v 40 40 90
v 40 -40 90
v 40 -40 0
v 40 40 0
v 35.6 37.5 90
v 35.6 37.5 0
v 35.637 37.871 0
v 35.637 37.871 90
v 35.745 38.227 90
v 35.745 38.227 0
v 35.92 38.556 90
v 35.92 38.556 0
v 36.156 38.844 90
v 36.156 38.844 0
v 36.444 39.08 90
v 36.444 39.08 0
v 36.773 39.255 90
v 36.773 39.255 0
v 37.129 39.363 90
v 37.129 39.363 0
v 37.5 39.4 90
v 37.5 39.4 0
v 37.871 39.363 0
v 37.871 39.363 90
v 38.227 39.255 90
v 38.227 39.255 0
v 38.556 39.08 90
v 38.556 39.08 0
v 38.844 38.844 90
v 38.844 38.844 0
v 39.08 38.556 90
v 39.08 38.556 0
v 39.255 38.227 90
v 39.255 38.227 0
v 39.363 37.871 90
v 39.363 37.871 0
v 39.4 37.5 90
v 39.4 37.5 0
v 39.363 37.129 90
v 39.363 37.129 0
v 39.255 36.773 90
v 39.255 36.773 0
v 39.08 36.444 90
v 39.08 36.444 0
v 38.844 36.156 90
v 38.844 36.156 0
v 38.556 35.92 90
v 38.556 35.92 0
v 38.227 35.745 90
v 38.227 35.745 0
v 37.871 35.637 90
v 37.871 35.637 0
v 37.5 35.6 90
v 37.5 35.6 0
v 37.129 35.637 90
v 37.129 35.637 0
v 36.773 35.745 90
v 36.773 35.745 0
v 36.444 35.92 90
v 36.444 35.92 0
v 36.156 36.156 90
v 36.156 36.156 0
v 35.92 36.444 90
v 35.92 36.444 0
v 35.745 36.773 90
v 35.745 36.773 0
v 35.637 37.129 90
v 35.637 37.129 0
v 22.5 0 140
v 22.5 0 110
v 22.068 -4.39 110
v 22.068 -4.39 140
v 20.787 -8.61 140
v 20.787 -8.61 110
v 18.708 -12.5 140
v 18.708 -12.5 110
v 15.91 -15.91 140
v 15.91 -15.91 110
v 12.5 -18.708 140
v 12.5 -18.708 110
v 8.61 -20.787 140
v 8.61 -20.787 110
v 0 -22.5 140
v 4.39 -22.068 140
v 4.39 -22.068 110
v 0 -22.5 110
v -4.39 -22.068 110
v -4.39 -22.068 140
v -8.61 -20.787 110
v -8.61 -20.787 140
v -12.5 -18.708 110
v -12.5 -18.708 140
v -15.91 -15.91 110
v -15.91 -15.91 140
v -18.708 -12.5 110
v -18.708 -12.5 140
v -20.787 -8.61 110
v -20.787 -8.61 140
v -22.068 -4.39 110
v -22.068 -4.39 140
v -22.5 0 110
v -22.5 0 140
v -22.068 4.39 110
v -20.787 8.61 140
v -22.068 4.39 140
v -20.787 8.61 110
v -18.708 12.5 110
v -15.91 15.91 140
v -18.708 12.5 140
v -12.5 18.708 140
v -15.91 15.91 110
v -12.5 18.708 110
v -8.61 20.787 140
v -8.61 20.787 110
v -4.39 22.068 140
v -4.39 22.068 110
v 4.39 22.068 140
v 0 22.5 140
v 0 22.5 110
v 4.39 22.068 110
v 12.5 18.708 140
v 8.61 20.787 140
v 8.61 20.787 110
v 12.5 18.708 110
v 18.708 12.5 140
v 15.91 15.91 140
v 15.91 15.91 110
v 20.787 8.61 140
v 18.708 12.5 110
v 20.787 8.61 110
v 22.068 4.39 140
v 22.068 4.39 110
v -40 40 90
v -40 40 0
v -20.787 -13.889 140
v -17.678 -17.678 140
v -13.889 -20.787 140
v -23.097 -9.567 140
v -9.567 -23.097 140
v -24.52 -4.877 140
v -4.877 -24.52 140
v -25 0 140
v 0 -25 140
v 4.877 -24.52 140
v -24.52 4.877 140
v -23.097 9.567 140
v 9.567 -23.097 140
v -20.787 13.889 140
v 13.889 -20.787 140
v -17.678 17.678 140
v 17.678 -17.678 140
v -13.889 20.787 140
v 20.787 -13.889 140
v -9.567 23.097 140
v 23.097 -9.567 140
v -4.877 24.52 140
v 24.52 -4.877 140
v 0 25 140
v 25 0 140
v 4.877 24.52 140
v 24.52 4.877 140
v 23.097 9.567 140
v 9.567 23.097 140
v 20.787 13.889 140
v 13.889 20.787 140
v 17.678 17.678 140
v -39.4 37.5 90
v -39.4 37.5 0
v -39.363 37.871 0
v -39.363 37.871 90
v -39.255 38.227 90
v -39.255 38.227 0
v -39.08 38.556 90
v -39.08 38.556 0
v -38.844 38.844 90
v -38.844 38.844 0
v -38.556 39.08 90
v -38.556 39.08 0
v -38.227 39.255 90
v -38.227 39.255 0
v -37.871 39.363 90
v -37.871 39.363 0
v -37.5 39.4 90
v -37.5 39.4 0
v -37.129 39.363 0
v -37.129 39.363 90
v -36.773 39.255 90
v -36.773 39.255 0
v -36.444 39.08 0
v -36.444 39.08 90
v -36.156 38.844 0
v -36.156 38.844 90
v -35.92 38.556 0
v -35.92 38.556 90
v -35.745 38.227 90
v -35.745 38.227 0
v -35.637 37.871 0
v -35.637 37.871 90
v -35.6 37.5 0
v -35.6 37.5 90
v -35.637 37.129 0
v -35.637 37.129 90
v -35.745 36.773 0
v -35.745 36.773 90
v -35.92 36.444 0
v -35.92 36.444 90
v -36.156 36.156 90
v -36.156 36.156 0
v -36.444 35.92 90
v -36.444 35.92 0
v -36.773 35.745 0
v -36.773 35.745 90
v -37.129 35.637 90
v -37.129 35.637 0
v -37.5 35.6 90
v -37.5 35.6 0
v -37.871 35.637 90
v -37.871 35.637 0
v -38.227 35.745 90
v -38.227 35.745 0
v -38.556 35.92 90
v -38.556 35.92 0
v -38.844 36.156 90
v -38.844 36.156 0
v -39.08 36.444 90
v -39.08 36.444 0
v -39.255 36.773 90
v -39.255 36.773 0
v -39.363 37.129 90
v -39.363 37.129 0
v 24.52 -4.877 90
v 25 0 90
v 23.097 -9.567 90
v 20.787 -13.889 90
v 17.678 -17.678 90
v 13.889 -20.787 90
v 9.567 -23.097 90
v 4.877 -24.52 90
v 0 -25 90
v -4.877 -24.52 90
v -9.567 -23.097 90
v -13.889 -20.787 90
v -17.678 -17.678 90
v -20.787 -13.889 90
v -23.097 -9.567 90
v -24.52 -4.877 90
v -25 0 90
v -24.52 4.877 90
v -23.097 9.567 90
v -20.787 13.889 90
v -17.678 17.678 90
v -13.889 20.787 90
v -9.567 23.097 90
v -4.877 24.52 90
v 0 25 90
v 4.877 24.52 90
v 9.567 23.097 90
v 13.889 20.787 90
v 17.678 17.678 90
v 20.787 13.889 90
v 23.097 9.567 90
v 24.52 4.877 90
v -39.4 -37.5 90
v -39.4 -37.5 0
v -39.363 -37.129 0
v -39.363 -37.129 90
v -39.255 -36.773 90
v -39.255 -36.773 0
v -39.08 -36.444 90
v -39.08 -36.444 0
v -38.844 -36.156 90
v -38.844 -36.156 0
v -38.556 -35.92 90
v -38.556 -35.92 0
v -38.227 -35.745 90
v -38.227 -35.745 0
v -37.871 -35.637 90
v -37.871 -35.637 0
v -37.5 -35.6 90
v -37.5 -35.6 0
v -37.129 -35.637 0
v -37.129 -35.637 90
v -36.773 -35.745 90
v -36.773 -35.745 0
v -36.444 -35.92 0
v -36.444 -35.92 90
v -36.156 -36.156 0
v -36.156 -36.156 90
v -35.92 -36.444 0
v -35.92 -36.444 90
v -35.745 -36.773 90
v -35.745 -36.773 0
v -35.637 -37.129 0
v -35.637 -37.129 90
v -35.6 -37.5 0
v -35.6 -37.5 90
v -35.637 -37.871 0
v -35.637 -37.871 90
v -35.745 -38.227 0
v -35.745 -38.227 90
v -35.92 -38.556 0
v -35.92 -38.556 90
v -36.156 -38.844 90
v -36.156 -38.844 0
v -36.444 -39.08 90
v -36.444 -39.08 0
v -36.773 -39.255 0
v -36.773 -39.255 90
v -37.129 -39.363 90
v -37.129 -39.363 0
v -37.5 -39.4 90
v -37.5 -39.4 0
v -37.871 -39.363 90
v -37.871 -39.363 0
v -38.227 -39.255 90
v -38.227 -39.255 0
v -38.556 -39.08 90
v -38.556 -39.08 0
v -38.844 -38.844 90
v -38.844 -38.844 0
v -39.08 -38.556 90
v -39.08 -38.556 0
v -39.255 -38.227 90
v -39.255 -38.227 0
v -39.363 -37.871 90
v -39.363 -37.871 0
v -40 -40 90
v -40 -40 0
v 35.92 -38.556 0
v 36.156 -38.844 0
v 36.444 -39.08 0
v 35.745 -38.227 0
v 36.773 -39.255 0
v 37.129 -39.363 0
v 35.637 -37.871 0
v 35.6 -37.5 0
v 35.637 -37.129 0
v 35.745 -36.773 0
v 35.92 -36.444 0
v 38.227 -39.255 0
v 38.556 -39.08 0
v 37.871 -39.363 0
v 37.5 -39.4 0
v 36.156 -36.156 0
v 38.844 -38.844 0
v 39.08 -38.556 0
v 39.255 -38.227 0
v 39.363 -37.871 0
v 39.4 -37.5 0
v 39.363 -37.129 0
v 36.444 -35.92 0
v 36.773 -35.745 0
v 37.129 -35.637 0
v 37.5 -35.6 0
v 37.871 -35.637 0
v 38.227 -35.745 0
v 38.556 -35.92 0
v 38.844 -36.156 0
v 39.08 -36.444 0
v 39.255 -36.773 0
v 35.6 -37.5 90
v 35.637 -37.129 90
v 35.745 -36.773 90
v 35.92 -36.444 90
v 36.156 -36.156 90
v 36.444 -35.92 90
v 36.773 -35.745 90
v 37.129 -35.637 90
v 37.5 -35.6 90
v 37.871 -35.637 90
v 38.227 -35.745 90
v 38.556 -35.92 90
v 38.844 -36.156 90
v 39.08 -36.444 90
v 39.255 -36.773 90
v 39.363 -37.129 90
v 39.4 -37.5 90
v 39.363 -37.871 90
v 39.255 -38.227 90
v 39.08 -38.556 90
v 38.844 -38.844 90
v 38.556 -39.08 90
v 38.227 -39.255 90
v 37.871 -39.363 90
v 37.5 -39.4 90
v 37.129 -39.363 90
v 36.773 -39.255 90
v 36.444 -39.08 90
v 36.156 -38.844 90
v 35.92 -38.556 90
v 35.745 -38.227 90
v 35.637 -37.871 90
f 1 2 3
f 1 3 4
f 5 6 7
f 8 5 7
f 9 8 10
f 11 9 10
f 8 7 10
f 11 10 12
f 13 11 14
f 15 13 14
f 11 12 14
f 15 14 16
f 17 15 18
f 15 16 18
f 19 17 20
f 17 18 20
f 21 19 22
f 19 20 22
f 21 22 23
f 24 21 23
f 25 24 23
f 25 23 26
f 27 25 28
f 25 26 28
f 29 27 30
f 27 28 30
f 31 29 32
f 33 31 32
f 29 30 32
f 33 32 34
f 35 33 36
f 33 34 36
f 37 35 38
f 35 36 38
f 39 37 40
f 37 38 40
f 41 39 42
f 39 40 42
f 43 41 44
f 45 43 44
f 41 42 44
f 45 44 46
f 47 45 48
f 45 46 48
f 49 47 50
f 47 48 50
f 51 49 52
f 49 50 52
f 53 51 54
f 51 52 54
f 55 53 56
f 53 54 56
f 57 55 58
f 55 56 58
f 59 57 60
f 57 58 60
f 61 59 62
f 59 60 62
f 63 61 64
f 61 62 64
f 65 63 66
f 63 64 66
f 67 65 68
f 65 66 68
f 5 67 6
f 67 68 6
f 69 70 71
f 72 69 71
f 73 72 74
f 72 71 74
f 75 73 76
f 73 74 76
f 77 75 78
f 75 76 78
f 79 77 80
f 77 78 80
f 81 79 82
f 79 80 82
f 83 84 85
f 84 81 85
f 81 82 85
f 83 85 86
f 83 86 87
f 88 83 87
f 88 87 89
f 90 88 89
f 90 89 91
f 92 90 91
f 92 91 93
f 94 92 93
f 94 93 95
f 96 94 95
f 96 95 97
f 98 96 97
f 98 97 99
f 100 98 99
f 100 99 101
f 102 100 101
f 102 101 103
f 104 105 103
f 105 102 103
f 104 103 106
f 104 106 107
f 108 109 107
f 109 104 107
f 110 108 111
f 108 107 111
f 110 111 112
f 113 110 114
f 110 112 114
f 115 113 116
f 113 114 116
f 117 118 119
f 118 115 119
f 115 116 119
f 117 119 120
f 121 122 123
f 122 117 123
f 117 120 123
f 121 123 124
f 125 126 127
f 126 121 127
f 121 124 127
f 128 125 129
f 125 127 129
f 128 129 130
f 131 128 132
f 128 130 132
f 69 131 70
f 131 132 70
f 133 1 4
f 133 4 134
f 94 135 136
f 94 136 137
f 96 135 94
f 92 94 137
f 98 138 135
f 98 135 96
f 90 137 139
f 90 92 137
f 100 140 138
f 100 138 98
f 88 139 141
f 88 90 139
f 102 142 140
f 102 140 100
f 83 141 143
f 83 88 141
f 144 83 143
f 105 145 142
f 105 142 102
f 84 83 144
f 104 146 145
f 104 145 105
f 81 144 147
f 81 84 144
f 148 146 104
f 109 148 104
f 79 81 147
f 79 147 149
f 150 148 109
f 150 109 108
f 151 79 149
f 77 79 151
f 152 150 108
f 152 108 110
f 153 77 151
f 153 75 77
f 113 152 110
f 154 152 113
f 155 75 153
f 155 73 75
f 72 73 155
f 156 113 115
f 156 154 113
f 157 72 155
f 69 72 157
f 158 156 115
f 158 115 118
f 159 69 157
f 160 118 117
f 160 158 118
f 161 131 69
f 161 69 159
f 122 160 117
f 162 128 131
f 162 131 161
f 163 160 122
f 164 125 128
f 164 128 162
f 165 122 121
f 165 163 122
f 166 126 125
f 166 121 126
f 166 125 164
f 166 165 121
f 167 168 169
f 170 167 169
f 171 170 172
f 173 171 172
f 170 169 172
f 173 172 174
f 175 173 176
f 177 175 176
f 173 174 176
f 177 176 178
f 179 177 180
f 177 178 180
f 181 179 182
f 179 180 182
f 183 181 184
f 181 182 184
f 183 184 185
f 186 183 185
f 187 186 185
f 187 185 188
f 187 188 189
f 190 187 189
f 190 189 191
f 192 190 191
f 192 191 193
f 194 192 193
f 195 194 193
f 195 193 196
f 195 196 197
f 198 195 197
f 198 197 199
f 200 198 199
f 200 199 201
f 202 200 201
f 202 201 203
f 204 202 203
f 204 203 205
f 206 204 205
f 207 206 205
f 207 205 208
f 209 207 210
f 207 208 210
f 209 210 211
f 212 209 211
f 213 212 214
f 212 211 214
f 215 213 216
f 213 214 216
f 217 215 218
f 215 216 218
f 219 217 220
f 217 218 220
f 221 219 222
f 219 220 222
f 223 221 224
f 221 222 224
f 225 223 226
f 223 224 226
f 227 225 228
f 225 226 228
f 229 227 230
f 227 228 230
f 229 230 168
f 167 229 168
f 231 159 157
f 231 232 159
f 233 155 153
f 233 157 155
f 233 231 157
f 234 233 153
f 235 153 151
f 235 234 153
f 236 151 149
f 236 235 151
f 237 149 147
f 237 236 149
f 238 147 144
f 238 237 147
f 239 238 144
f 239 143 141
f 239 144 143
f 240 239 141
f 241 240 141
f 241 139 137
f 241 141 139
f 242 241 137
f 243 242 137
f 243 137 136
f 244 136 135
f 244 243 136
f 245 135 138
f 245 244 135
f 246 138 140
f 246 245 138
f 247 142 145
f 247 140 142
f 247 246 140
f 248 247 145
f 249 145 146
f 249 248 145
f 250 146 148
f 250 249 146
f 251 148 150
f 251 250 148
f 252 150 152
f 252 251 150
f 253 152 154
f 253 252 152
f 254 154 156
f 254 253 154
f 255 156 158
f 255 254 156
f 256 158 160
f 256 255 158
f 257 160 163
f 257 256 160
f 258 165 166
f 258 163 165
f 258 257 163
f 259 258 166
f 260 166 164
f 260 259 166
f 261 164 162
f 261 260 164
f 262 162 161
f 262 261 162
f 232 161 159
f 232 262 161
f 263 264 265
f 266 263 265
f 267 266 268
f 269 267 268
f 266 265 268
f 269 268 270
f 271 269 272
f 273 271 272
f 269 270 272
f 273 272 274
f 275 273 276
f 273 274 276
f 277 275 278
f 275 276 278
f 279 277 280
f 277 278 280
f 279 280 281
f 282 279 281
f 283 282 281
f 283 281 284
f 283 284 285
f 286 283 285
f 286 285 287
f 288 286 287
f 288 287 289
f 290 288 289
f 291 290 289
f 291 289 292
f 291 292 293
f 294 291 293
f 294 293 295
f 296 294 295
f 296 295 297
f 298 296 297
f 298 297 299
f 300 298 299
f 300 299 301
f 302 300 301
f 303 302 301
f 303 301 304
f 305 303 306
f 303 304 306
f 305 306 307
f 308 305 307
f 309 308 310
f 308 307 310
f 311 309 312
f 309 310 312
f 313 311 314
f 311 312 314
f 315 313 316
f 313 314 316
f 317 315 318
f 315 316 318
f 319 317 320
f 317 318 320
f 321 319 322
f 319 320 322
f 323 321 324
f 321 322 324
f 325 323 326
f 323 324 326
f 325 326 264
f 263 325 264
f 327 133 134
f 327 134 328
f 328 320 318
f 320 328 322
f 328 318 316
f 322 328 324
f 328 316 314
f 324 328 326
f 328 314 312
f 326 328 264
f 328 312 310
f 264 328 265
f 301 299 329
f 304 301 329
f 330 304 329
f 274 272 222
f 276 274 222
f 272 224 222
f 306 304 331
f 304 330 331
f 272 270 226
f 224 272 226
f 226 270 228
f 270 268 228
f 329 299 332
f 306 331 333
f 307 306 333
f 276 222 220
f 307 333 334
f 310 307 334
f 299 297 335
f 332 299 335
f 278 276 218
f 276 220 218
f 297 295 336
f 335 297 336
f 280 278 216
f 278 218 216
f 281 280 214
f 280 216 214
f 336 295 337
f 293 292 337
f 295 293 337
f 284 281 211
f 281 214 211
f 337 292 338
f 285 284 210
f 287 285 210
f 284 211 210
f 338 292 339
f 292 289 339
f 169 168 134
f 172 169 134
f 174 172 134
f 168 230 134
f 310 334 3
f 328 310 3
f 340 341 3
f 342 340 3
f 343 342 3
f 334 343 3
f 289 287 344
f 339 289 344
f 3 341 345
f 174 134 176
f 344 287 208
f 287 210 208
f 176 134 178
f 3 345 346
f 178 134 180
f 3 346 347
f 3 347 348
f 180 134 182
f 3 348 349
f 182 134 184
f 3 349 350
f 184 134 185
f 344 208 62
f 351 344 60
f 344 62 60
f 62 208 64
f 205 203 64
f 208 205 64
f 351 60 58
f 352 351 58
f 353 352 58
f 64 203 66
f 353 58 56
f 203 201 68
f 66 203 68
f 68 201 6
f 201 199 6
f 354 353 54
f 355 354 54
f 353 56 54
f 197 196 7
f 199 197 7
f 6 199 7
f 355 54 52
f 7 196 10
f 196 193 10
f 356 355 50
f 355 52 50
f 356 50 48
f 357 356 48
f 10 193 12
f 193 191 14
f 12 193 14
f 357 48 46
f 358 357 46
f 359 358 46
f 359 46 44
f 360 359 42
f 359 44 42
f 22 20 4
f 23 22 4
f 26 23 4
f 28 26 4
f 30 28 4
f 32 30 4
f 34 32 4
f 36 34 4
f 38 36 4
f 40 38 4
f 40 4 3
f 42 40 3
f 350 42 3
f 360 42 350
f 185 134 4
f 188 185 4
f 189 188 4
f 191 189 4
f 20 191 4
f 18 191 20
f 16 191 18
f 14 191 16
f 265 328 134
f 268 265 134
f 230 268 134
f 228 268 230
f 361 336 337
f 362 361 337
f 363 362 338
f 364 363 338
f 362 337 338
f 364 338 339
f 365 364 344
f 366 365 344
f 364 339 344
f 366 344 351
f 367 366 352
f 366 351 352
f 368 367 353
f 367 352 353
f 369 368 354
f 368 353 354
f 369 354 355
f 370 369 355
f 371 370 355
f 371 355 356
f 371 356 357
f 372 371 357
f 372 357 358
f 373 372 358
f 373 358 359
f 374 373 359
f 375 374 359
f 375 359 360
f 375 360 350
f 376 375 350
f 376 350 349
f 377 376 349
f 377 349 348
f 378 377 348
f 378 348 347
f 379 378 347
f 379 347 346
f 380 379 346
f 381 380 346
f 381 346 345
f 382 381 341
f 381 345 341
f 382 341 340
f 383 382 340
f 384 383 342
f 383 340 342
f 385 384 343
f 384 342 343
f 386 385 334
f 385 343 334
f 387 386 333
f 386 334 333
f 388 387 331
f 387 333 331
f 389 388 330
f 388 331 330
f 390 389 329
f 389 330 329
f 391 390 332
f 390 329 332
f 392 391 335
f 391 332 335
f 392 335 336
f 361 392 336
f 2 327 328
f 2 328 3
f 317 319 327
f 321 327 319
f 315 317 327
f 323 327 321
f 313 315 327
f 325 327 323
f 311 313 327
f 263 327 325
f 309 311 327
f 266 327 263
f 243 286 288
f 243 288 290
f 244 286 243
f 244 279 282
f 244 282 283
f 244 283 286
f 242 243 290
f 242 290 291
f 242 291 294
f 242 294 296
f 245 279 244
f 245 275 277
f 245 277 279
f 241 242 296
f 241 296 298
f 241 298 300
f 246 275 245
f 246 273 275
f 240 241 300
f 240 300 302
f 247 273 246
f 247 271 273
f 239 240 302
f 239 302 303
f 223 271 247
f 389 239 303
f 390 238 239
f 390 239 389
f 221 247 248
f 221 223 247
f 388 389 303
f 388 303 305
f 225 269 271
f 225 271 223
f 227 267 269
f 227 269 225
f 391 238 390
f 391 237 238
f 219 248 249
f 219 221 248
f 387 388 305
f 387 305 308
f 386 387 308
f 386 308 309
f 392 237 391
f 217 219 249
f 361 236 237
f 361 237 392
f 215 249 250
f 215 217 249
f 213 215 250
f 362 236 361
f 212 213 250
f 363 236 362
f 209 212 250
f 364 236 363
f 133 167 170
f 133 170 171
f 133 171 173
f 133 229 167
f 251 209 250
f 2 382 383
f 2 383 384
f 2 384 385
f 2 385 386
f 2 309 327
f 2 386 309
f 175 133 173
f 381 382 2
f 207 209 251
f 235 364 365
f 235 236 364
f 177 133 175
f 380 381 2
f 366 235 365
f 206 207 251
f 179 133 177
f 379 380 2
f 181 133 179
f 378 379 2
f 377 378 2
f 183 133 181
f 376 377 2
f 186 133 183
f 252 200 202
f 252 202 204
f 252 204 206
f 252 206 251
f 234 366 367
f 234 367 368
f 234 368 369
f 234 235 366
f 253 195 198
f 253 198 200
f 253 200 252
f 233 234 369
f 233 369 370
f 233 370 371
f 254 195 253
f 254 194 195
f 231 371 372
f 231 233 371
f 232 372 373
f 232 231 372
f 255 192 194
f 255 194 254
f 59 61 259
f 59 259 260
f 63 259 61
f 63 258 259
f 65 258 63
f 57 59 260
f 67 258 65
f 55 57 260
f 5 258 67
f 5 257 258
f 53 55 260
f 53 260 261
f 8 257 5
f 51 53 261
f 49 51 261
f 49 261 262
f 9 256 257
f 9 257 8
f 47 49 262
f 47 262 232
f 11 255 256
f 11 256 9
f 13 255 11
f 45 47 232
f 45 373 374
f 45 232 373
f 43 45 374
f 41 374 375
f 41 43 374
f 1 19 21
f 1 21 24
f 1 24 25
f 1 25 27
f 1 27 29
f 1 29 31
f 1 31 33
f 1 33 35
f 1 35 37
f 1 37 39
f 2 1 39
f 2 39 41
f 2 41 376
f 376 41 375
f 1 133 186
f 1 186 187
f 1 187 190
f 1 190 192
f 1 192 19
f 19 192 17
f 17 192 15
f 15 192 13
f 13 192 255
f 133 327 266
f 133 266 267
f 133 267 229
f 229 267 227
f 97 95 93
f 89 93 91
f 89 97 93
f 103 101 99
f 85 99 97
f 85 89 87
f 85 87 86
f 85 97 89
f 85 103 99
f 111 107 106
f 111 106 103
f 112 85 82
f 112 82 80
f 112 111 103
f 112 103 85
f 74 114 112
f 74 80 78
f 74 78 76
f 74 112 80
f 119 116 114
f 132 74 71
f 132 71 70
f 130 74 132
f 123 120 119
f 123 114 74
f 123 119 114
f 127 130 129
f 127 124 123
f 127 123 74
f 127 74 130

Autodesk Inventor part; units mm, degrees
ref_plane "YZ Plane" through (0, 0, 0) normal (1, 0, 0) x (0, 1, 0)
ref_plane "XZ Plane" through (0, 0, 0) normal (0, 1, 0) x (-1, 0, 0)
ref_plane "XY Plane" through (0, 0, 0) normal (0, 0, 1) x (1, 0, 0)
sketch "Boceto1" plane through (0, 0, 0) normal (0, 0, 1) x (1, 0, 0)
  line L0 (-40, -40) -> (40, -40)
  line L1 (40, -40) -> (40, 40)
  line L2 (40, 40) -> (-40, 40)
  line L3 (-40, 40) -> (-40, -40)
  line L4 (-40, -40) -> (40, 40) construction
  line L5 (40, -40) -> (-40, 40) construction
  point P0 (0, 0)
  dimension "d0" = 80
  dimension "d1" = 80
extrude "Extrusión1" add sketch "Boceto1" along normal blind 90
sketch "Boceto2" plane through (0, 0, 90) normal (0, 0, 1) x (1, 0, 0)
  circle A0 centre (0, 0) radius 25
  circle A1 centre (0, 0) radius 22.5
  dimension "d4" = 50
  dimension "d5" = 45
extrude "Extrusión2" add sketch "Boceto2" along normal blind 50
sketch "Boceto3" plane through (0, 0, 0) normal (0, 0, -1) x (-1, 0, 0)
  line L0 (-35, -35) -> (35, -35)
  line L1 (35, -35) -> (35, 35)
  line L2 (35, 35) -> (-35, 35)
  line L3 (-35, 35) -> (-35, -35)
  line L4 (-35, -35) -> (35, 35) construction
  line L5 (35, -35) -> (-35, 35) construction
  line L6 (-40, 40) -> (40, 40) projected
  line L7 (-40, -40) -> (-40, 40) projected
  circle A0 centre (-37.5, 37.5) radius 1.9
  circle A1 centre (37.5, 37.5) radius 1.9
  circle A2 centre (37.5, -37.5) radius 1.9
  circle A3 centre (-37.5, -37.5) radius 1.9
  point P0 (0, 0)
  dimension "d9" = 70
sketch "Boceto4" plane through (0, 0, 0) normal (0, 0, -1) x (-1, 0, 0)
  point P0 (0, 0)
extrude "Extrusión3" cut sketch "Boceto3" against normal blind 90 contours A0 | A1 | A2 | A3
sketch "Boceto5" plane through (0, 0, 90) normal (0, 0, 1) x (1, 0, 0)
  circle A0 centre (0, 0) radius 22.5
  dimension "d14" = 45
extrude "Extrusión4" add sketch "Boceto5" along normal blind 20
thread "Rosca1" size "M4x0.7" class "6H" standard "ANSI Metric M Profile" full length
thread "Rosca2" size "M4x0.7" class "6H" standard "ANSI Metric M Profile" full length
thread "Rosca3" size "M4x0.7" class "6H" standard "ANSI Metric M Profile" full length
thread "Rosca4" size "M4x0.7" class "6H" standard "ANSI Metric M Profile" full length
thread "Rosca5" size "M45x4.5" class "6H" standard "ANSI Metric M Profile" full length
properties part number "PRACTICA 1"
